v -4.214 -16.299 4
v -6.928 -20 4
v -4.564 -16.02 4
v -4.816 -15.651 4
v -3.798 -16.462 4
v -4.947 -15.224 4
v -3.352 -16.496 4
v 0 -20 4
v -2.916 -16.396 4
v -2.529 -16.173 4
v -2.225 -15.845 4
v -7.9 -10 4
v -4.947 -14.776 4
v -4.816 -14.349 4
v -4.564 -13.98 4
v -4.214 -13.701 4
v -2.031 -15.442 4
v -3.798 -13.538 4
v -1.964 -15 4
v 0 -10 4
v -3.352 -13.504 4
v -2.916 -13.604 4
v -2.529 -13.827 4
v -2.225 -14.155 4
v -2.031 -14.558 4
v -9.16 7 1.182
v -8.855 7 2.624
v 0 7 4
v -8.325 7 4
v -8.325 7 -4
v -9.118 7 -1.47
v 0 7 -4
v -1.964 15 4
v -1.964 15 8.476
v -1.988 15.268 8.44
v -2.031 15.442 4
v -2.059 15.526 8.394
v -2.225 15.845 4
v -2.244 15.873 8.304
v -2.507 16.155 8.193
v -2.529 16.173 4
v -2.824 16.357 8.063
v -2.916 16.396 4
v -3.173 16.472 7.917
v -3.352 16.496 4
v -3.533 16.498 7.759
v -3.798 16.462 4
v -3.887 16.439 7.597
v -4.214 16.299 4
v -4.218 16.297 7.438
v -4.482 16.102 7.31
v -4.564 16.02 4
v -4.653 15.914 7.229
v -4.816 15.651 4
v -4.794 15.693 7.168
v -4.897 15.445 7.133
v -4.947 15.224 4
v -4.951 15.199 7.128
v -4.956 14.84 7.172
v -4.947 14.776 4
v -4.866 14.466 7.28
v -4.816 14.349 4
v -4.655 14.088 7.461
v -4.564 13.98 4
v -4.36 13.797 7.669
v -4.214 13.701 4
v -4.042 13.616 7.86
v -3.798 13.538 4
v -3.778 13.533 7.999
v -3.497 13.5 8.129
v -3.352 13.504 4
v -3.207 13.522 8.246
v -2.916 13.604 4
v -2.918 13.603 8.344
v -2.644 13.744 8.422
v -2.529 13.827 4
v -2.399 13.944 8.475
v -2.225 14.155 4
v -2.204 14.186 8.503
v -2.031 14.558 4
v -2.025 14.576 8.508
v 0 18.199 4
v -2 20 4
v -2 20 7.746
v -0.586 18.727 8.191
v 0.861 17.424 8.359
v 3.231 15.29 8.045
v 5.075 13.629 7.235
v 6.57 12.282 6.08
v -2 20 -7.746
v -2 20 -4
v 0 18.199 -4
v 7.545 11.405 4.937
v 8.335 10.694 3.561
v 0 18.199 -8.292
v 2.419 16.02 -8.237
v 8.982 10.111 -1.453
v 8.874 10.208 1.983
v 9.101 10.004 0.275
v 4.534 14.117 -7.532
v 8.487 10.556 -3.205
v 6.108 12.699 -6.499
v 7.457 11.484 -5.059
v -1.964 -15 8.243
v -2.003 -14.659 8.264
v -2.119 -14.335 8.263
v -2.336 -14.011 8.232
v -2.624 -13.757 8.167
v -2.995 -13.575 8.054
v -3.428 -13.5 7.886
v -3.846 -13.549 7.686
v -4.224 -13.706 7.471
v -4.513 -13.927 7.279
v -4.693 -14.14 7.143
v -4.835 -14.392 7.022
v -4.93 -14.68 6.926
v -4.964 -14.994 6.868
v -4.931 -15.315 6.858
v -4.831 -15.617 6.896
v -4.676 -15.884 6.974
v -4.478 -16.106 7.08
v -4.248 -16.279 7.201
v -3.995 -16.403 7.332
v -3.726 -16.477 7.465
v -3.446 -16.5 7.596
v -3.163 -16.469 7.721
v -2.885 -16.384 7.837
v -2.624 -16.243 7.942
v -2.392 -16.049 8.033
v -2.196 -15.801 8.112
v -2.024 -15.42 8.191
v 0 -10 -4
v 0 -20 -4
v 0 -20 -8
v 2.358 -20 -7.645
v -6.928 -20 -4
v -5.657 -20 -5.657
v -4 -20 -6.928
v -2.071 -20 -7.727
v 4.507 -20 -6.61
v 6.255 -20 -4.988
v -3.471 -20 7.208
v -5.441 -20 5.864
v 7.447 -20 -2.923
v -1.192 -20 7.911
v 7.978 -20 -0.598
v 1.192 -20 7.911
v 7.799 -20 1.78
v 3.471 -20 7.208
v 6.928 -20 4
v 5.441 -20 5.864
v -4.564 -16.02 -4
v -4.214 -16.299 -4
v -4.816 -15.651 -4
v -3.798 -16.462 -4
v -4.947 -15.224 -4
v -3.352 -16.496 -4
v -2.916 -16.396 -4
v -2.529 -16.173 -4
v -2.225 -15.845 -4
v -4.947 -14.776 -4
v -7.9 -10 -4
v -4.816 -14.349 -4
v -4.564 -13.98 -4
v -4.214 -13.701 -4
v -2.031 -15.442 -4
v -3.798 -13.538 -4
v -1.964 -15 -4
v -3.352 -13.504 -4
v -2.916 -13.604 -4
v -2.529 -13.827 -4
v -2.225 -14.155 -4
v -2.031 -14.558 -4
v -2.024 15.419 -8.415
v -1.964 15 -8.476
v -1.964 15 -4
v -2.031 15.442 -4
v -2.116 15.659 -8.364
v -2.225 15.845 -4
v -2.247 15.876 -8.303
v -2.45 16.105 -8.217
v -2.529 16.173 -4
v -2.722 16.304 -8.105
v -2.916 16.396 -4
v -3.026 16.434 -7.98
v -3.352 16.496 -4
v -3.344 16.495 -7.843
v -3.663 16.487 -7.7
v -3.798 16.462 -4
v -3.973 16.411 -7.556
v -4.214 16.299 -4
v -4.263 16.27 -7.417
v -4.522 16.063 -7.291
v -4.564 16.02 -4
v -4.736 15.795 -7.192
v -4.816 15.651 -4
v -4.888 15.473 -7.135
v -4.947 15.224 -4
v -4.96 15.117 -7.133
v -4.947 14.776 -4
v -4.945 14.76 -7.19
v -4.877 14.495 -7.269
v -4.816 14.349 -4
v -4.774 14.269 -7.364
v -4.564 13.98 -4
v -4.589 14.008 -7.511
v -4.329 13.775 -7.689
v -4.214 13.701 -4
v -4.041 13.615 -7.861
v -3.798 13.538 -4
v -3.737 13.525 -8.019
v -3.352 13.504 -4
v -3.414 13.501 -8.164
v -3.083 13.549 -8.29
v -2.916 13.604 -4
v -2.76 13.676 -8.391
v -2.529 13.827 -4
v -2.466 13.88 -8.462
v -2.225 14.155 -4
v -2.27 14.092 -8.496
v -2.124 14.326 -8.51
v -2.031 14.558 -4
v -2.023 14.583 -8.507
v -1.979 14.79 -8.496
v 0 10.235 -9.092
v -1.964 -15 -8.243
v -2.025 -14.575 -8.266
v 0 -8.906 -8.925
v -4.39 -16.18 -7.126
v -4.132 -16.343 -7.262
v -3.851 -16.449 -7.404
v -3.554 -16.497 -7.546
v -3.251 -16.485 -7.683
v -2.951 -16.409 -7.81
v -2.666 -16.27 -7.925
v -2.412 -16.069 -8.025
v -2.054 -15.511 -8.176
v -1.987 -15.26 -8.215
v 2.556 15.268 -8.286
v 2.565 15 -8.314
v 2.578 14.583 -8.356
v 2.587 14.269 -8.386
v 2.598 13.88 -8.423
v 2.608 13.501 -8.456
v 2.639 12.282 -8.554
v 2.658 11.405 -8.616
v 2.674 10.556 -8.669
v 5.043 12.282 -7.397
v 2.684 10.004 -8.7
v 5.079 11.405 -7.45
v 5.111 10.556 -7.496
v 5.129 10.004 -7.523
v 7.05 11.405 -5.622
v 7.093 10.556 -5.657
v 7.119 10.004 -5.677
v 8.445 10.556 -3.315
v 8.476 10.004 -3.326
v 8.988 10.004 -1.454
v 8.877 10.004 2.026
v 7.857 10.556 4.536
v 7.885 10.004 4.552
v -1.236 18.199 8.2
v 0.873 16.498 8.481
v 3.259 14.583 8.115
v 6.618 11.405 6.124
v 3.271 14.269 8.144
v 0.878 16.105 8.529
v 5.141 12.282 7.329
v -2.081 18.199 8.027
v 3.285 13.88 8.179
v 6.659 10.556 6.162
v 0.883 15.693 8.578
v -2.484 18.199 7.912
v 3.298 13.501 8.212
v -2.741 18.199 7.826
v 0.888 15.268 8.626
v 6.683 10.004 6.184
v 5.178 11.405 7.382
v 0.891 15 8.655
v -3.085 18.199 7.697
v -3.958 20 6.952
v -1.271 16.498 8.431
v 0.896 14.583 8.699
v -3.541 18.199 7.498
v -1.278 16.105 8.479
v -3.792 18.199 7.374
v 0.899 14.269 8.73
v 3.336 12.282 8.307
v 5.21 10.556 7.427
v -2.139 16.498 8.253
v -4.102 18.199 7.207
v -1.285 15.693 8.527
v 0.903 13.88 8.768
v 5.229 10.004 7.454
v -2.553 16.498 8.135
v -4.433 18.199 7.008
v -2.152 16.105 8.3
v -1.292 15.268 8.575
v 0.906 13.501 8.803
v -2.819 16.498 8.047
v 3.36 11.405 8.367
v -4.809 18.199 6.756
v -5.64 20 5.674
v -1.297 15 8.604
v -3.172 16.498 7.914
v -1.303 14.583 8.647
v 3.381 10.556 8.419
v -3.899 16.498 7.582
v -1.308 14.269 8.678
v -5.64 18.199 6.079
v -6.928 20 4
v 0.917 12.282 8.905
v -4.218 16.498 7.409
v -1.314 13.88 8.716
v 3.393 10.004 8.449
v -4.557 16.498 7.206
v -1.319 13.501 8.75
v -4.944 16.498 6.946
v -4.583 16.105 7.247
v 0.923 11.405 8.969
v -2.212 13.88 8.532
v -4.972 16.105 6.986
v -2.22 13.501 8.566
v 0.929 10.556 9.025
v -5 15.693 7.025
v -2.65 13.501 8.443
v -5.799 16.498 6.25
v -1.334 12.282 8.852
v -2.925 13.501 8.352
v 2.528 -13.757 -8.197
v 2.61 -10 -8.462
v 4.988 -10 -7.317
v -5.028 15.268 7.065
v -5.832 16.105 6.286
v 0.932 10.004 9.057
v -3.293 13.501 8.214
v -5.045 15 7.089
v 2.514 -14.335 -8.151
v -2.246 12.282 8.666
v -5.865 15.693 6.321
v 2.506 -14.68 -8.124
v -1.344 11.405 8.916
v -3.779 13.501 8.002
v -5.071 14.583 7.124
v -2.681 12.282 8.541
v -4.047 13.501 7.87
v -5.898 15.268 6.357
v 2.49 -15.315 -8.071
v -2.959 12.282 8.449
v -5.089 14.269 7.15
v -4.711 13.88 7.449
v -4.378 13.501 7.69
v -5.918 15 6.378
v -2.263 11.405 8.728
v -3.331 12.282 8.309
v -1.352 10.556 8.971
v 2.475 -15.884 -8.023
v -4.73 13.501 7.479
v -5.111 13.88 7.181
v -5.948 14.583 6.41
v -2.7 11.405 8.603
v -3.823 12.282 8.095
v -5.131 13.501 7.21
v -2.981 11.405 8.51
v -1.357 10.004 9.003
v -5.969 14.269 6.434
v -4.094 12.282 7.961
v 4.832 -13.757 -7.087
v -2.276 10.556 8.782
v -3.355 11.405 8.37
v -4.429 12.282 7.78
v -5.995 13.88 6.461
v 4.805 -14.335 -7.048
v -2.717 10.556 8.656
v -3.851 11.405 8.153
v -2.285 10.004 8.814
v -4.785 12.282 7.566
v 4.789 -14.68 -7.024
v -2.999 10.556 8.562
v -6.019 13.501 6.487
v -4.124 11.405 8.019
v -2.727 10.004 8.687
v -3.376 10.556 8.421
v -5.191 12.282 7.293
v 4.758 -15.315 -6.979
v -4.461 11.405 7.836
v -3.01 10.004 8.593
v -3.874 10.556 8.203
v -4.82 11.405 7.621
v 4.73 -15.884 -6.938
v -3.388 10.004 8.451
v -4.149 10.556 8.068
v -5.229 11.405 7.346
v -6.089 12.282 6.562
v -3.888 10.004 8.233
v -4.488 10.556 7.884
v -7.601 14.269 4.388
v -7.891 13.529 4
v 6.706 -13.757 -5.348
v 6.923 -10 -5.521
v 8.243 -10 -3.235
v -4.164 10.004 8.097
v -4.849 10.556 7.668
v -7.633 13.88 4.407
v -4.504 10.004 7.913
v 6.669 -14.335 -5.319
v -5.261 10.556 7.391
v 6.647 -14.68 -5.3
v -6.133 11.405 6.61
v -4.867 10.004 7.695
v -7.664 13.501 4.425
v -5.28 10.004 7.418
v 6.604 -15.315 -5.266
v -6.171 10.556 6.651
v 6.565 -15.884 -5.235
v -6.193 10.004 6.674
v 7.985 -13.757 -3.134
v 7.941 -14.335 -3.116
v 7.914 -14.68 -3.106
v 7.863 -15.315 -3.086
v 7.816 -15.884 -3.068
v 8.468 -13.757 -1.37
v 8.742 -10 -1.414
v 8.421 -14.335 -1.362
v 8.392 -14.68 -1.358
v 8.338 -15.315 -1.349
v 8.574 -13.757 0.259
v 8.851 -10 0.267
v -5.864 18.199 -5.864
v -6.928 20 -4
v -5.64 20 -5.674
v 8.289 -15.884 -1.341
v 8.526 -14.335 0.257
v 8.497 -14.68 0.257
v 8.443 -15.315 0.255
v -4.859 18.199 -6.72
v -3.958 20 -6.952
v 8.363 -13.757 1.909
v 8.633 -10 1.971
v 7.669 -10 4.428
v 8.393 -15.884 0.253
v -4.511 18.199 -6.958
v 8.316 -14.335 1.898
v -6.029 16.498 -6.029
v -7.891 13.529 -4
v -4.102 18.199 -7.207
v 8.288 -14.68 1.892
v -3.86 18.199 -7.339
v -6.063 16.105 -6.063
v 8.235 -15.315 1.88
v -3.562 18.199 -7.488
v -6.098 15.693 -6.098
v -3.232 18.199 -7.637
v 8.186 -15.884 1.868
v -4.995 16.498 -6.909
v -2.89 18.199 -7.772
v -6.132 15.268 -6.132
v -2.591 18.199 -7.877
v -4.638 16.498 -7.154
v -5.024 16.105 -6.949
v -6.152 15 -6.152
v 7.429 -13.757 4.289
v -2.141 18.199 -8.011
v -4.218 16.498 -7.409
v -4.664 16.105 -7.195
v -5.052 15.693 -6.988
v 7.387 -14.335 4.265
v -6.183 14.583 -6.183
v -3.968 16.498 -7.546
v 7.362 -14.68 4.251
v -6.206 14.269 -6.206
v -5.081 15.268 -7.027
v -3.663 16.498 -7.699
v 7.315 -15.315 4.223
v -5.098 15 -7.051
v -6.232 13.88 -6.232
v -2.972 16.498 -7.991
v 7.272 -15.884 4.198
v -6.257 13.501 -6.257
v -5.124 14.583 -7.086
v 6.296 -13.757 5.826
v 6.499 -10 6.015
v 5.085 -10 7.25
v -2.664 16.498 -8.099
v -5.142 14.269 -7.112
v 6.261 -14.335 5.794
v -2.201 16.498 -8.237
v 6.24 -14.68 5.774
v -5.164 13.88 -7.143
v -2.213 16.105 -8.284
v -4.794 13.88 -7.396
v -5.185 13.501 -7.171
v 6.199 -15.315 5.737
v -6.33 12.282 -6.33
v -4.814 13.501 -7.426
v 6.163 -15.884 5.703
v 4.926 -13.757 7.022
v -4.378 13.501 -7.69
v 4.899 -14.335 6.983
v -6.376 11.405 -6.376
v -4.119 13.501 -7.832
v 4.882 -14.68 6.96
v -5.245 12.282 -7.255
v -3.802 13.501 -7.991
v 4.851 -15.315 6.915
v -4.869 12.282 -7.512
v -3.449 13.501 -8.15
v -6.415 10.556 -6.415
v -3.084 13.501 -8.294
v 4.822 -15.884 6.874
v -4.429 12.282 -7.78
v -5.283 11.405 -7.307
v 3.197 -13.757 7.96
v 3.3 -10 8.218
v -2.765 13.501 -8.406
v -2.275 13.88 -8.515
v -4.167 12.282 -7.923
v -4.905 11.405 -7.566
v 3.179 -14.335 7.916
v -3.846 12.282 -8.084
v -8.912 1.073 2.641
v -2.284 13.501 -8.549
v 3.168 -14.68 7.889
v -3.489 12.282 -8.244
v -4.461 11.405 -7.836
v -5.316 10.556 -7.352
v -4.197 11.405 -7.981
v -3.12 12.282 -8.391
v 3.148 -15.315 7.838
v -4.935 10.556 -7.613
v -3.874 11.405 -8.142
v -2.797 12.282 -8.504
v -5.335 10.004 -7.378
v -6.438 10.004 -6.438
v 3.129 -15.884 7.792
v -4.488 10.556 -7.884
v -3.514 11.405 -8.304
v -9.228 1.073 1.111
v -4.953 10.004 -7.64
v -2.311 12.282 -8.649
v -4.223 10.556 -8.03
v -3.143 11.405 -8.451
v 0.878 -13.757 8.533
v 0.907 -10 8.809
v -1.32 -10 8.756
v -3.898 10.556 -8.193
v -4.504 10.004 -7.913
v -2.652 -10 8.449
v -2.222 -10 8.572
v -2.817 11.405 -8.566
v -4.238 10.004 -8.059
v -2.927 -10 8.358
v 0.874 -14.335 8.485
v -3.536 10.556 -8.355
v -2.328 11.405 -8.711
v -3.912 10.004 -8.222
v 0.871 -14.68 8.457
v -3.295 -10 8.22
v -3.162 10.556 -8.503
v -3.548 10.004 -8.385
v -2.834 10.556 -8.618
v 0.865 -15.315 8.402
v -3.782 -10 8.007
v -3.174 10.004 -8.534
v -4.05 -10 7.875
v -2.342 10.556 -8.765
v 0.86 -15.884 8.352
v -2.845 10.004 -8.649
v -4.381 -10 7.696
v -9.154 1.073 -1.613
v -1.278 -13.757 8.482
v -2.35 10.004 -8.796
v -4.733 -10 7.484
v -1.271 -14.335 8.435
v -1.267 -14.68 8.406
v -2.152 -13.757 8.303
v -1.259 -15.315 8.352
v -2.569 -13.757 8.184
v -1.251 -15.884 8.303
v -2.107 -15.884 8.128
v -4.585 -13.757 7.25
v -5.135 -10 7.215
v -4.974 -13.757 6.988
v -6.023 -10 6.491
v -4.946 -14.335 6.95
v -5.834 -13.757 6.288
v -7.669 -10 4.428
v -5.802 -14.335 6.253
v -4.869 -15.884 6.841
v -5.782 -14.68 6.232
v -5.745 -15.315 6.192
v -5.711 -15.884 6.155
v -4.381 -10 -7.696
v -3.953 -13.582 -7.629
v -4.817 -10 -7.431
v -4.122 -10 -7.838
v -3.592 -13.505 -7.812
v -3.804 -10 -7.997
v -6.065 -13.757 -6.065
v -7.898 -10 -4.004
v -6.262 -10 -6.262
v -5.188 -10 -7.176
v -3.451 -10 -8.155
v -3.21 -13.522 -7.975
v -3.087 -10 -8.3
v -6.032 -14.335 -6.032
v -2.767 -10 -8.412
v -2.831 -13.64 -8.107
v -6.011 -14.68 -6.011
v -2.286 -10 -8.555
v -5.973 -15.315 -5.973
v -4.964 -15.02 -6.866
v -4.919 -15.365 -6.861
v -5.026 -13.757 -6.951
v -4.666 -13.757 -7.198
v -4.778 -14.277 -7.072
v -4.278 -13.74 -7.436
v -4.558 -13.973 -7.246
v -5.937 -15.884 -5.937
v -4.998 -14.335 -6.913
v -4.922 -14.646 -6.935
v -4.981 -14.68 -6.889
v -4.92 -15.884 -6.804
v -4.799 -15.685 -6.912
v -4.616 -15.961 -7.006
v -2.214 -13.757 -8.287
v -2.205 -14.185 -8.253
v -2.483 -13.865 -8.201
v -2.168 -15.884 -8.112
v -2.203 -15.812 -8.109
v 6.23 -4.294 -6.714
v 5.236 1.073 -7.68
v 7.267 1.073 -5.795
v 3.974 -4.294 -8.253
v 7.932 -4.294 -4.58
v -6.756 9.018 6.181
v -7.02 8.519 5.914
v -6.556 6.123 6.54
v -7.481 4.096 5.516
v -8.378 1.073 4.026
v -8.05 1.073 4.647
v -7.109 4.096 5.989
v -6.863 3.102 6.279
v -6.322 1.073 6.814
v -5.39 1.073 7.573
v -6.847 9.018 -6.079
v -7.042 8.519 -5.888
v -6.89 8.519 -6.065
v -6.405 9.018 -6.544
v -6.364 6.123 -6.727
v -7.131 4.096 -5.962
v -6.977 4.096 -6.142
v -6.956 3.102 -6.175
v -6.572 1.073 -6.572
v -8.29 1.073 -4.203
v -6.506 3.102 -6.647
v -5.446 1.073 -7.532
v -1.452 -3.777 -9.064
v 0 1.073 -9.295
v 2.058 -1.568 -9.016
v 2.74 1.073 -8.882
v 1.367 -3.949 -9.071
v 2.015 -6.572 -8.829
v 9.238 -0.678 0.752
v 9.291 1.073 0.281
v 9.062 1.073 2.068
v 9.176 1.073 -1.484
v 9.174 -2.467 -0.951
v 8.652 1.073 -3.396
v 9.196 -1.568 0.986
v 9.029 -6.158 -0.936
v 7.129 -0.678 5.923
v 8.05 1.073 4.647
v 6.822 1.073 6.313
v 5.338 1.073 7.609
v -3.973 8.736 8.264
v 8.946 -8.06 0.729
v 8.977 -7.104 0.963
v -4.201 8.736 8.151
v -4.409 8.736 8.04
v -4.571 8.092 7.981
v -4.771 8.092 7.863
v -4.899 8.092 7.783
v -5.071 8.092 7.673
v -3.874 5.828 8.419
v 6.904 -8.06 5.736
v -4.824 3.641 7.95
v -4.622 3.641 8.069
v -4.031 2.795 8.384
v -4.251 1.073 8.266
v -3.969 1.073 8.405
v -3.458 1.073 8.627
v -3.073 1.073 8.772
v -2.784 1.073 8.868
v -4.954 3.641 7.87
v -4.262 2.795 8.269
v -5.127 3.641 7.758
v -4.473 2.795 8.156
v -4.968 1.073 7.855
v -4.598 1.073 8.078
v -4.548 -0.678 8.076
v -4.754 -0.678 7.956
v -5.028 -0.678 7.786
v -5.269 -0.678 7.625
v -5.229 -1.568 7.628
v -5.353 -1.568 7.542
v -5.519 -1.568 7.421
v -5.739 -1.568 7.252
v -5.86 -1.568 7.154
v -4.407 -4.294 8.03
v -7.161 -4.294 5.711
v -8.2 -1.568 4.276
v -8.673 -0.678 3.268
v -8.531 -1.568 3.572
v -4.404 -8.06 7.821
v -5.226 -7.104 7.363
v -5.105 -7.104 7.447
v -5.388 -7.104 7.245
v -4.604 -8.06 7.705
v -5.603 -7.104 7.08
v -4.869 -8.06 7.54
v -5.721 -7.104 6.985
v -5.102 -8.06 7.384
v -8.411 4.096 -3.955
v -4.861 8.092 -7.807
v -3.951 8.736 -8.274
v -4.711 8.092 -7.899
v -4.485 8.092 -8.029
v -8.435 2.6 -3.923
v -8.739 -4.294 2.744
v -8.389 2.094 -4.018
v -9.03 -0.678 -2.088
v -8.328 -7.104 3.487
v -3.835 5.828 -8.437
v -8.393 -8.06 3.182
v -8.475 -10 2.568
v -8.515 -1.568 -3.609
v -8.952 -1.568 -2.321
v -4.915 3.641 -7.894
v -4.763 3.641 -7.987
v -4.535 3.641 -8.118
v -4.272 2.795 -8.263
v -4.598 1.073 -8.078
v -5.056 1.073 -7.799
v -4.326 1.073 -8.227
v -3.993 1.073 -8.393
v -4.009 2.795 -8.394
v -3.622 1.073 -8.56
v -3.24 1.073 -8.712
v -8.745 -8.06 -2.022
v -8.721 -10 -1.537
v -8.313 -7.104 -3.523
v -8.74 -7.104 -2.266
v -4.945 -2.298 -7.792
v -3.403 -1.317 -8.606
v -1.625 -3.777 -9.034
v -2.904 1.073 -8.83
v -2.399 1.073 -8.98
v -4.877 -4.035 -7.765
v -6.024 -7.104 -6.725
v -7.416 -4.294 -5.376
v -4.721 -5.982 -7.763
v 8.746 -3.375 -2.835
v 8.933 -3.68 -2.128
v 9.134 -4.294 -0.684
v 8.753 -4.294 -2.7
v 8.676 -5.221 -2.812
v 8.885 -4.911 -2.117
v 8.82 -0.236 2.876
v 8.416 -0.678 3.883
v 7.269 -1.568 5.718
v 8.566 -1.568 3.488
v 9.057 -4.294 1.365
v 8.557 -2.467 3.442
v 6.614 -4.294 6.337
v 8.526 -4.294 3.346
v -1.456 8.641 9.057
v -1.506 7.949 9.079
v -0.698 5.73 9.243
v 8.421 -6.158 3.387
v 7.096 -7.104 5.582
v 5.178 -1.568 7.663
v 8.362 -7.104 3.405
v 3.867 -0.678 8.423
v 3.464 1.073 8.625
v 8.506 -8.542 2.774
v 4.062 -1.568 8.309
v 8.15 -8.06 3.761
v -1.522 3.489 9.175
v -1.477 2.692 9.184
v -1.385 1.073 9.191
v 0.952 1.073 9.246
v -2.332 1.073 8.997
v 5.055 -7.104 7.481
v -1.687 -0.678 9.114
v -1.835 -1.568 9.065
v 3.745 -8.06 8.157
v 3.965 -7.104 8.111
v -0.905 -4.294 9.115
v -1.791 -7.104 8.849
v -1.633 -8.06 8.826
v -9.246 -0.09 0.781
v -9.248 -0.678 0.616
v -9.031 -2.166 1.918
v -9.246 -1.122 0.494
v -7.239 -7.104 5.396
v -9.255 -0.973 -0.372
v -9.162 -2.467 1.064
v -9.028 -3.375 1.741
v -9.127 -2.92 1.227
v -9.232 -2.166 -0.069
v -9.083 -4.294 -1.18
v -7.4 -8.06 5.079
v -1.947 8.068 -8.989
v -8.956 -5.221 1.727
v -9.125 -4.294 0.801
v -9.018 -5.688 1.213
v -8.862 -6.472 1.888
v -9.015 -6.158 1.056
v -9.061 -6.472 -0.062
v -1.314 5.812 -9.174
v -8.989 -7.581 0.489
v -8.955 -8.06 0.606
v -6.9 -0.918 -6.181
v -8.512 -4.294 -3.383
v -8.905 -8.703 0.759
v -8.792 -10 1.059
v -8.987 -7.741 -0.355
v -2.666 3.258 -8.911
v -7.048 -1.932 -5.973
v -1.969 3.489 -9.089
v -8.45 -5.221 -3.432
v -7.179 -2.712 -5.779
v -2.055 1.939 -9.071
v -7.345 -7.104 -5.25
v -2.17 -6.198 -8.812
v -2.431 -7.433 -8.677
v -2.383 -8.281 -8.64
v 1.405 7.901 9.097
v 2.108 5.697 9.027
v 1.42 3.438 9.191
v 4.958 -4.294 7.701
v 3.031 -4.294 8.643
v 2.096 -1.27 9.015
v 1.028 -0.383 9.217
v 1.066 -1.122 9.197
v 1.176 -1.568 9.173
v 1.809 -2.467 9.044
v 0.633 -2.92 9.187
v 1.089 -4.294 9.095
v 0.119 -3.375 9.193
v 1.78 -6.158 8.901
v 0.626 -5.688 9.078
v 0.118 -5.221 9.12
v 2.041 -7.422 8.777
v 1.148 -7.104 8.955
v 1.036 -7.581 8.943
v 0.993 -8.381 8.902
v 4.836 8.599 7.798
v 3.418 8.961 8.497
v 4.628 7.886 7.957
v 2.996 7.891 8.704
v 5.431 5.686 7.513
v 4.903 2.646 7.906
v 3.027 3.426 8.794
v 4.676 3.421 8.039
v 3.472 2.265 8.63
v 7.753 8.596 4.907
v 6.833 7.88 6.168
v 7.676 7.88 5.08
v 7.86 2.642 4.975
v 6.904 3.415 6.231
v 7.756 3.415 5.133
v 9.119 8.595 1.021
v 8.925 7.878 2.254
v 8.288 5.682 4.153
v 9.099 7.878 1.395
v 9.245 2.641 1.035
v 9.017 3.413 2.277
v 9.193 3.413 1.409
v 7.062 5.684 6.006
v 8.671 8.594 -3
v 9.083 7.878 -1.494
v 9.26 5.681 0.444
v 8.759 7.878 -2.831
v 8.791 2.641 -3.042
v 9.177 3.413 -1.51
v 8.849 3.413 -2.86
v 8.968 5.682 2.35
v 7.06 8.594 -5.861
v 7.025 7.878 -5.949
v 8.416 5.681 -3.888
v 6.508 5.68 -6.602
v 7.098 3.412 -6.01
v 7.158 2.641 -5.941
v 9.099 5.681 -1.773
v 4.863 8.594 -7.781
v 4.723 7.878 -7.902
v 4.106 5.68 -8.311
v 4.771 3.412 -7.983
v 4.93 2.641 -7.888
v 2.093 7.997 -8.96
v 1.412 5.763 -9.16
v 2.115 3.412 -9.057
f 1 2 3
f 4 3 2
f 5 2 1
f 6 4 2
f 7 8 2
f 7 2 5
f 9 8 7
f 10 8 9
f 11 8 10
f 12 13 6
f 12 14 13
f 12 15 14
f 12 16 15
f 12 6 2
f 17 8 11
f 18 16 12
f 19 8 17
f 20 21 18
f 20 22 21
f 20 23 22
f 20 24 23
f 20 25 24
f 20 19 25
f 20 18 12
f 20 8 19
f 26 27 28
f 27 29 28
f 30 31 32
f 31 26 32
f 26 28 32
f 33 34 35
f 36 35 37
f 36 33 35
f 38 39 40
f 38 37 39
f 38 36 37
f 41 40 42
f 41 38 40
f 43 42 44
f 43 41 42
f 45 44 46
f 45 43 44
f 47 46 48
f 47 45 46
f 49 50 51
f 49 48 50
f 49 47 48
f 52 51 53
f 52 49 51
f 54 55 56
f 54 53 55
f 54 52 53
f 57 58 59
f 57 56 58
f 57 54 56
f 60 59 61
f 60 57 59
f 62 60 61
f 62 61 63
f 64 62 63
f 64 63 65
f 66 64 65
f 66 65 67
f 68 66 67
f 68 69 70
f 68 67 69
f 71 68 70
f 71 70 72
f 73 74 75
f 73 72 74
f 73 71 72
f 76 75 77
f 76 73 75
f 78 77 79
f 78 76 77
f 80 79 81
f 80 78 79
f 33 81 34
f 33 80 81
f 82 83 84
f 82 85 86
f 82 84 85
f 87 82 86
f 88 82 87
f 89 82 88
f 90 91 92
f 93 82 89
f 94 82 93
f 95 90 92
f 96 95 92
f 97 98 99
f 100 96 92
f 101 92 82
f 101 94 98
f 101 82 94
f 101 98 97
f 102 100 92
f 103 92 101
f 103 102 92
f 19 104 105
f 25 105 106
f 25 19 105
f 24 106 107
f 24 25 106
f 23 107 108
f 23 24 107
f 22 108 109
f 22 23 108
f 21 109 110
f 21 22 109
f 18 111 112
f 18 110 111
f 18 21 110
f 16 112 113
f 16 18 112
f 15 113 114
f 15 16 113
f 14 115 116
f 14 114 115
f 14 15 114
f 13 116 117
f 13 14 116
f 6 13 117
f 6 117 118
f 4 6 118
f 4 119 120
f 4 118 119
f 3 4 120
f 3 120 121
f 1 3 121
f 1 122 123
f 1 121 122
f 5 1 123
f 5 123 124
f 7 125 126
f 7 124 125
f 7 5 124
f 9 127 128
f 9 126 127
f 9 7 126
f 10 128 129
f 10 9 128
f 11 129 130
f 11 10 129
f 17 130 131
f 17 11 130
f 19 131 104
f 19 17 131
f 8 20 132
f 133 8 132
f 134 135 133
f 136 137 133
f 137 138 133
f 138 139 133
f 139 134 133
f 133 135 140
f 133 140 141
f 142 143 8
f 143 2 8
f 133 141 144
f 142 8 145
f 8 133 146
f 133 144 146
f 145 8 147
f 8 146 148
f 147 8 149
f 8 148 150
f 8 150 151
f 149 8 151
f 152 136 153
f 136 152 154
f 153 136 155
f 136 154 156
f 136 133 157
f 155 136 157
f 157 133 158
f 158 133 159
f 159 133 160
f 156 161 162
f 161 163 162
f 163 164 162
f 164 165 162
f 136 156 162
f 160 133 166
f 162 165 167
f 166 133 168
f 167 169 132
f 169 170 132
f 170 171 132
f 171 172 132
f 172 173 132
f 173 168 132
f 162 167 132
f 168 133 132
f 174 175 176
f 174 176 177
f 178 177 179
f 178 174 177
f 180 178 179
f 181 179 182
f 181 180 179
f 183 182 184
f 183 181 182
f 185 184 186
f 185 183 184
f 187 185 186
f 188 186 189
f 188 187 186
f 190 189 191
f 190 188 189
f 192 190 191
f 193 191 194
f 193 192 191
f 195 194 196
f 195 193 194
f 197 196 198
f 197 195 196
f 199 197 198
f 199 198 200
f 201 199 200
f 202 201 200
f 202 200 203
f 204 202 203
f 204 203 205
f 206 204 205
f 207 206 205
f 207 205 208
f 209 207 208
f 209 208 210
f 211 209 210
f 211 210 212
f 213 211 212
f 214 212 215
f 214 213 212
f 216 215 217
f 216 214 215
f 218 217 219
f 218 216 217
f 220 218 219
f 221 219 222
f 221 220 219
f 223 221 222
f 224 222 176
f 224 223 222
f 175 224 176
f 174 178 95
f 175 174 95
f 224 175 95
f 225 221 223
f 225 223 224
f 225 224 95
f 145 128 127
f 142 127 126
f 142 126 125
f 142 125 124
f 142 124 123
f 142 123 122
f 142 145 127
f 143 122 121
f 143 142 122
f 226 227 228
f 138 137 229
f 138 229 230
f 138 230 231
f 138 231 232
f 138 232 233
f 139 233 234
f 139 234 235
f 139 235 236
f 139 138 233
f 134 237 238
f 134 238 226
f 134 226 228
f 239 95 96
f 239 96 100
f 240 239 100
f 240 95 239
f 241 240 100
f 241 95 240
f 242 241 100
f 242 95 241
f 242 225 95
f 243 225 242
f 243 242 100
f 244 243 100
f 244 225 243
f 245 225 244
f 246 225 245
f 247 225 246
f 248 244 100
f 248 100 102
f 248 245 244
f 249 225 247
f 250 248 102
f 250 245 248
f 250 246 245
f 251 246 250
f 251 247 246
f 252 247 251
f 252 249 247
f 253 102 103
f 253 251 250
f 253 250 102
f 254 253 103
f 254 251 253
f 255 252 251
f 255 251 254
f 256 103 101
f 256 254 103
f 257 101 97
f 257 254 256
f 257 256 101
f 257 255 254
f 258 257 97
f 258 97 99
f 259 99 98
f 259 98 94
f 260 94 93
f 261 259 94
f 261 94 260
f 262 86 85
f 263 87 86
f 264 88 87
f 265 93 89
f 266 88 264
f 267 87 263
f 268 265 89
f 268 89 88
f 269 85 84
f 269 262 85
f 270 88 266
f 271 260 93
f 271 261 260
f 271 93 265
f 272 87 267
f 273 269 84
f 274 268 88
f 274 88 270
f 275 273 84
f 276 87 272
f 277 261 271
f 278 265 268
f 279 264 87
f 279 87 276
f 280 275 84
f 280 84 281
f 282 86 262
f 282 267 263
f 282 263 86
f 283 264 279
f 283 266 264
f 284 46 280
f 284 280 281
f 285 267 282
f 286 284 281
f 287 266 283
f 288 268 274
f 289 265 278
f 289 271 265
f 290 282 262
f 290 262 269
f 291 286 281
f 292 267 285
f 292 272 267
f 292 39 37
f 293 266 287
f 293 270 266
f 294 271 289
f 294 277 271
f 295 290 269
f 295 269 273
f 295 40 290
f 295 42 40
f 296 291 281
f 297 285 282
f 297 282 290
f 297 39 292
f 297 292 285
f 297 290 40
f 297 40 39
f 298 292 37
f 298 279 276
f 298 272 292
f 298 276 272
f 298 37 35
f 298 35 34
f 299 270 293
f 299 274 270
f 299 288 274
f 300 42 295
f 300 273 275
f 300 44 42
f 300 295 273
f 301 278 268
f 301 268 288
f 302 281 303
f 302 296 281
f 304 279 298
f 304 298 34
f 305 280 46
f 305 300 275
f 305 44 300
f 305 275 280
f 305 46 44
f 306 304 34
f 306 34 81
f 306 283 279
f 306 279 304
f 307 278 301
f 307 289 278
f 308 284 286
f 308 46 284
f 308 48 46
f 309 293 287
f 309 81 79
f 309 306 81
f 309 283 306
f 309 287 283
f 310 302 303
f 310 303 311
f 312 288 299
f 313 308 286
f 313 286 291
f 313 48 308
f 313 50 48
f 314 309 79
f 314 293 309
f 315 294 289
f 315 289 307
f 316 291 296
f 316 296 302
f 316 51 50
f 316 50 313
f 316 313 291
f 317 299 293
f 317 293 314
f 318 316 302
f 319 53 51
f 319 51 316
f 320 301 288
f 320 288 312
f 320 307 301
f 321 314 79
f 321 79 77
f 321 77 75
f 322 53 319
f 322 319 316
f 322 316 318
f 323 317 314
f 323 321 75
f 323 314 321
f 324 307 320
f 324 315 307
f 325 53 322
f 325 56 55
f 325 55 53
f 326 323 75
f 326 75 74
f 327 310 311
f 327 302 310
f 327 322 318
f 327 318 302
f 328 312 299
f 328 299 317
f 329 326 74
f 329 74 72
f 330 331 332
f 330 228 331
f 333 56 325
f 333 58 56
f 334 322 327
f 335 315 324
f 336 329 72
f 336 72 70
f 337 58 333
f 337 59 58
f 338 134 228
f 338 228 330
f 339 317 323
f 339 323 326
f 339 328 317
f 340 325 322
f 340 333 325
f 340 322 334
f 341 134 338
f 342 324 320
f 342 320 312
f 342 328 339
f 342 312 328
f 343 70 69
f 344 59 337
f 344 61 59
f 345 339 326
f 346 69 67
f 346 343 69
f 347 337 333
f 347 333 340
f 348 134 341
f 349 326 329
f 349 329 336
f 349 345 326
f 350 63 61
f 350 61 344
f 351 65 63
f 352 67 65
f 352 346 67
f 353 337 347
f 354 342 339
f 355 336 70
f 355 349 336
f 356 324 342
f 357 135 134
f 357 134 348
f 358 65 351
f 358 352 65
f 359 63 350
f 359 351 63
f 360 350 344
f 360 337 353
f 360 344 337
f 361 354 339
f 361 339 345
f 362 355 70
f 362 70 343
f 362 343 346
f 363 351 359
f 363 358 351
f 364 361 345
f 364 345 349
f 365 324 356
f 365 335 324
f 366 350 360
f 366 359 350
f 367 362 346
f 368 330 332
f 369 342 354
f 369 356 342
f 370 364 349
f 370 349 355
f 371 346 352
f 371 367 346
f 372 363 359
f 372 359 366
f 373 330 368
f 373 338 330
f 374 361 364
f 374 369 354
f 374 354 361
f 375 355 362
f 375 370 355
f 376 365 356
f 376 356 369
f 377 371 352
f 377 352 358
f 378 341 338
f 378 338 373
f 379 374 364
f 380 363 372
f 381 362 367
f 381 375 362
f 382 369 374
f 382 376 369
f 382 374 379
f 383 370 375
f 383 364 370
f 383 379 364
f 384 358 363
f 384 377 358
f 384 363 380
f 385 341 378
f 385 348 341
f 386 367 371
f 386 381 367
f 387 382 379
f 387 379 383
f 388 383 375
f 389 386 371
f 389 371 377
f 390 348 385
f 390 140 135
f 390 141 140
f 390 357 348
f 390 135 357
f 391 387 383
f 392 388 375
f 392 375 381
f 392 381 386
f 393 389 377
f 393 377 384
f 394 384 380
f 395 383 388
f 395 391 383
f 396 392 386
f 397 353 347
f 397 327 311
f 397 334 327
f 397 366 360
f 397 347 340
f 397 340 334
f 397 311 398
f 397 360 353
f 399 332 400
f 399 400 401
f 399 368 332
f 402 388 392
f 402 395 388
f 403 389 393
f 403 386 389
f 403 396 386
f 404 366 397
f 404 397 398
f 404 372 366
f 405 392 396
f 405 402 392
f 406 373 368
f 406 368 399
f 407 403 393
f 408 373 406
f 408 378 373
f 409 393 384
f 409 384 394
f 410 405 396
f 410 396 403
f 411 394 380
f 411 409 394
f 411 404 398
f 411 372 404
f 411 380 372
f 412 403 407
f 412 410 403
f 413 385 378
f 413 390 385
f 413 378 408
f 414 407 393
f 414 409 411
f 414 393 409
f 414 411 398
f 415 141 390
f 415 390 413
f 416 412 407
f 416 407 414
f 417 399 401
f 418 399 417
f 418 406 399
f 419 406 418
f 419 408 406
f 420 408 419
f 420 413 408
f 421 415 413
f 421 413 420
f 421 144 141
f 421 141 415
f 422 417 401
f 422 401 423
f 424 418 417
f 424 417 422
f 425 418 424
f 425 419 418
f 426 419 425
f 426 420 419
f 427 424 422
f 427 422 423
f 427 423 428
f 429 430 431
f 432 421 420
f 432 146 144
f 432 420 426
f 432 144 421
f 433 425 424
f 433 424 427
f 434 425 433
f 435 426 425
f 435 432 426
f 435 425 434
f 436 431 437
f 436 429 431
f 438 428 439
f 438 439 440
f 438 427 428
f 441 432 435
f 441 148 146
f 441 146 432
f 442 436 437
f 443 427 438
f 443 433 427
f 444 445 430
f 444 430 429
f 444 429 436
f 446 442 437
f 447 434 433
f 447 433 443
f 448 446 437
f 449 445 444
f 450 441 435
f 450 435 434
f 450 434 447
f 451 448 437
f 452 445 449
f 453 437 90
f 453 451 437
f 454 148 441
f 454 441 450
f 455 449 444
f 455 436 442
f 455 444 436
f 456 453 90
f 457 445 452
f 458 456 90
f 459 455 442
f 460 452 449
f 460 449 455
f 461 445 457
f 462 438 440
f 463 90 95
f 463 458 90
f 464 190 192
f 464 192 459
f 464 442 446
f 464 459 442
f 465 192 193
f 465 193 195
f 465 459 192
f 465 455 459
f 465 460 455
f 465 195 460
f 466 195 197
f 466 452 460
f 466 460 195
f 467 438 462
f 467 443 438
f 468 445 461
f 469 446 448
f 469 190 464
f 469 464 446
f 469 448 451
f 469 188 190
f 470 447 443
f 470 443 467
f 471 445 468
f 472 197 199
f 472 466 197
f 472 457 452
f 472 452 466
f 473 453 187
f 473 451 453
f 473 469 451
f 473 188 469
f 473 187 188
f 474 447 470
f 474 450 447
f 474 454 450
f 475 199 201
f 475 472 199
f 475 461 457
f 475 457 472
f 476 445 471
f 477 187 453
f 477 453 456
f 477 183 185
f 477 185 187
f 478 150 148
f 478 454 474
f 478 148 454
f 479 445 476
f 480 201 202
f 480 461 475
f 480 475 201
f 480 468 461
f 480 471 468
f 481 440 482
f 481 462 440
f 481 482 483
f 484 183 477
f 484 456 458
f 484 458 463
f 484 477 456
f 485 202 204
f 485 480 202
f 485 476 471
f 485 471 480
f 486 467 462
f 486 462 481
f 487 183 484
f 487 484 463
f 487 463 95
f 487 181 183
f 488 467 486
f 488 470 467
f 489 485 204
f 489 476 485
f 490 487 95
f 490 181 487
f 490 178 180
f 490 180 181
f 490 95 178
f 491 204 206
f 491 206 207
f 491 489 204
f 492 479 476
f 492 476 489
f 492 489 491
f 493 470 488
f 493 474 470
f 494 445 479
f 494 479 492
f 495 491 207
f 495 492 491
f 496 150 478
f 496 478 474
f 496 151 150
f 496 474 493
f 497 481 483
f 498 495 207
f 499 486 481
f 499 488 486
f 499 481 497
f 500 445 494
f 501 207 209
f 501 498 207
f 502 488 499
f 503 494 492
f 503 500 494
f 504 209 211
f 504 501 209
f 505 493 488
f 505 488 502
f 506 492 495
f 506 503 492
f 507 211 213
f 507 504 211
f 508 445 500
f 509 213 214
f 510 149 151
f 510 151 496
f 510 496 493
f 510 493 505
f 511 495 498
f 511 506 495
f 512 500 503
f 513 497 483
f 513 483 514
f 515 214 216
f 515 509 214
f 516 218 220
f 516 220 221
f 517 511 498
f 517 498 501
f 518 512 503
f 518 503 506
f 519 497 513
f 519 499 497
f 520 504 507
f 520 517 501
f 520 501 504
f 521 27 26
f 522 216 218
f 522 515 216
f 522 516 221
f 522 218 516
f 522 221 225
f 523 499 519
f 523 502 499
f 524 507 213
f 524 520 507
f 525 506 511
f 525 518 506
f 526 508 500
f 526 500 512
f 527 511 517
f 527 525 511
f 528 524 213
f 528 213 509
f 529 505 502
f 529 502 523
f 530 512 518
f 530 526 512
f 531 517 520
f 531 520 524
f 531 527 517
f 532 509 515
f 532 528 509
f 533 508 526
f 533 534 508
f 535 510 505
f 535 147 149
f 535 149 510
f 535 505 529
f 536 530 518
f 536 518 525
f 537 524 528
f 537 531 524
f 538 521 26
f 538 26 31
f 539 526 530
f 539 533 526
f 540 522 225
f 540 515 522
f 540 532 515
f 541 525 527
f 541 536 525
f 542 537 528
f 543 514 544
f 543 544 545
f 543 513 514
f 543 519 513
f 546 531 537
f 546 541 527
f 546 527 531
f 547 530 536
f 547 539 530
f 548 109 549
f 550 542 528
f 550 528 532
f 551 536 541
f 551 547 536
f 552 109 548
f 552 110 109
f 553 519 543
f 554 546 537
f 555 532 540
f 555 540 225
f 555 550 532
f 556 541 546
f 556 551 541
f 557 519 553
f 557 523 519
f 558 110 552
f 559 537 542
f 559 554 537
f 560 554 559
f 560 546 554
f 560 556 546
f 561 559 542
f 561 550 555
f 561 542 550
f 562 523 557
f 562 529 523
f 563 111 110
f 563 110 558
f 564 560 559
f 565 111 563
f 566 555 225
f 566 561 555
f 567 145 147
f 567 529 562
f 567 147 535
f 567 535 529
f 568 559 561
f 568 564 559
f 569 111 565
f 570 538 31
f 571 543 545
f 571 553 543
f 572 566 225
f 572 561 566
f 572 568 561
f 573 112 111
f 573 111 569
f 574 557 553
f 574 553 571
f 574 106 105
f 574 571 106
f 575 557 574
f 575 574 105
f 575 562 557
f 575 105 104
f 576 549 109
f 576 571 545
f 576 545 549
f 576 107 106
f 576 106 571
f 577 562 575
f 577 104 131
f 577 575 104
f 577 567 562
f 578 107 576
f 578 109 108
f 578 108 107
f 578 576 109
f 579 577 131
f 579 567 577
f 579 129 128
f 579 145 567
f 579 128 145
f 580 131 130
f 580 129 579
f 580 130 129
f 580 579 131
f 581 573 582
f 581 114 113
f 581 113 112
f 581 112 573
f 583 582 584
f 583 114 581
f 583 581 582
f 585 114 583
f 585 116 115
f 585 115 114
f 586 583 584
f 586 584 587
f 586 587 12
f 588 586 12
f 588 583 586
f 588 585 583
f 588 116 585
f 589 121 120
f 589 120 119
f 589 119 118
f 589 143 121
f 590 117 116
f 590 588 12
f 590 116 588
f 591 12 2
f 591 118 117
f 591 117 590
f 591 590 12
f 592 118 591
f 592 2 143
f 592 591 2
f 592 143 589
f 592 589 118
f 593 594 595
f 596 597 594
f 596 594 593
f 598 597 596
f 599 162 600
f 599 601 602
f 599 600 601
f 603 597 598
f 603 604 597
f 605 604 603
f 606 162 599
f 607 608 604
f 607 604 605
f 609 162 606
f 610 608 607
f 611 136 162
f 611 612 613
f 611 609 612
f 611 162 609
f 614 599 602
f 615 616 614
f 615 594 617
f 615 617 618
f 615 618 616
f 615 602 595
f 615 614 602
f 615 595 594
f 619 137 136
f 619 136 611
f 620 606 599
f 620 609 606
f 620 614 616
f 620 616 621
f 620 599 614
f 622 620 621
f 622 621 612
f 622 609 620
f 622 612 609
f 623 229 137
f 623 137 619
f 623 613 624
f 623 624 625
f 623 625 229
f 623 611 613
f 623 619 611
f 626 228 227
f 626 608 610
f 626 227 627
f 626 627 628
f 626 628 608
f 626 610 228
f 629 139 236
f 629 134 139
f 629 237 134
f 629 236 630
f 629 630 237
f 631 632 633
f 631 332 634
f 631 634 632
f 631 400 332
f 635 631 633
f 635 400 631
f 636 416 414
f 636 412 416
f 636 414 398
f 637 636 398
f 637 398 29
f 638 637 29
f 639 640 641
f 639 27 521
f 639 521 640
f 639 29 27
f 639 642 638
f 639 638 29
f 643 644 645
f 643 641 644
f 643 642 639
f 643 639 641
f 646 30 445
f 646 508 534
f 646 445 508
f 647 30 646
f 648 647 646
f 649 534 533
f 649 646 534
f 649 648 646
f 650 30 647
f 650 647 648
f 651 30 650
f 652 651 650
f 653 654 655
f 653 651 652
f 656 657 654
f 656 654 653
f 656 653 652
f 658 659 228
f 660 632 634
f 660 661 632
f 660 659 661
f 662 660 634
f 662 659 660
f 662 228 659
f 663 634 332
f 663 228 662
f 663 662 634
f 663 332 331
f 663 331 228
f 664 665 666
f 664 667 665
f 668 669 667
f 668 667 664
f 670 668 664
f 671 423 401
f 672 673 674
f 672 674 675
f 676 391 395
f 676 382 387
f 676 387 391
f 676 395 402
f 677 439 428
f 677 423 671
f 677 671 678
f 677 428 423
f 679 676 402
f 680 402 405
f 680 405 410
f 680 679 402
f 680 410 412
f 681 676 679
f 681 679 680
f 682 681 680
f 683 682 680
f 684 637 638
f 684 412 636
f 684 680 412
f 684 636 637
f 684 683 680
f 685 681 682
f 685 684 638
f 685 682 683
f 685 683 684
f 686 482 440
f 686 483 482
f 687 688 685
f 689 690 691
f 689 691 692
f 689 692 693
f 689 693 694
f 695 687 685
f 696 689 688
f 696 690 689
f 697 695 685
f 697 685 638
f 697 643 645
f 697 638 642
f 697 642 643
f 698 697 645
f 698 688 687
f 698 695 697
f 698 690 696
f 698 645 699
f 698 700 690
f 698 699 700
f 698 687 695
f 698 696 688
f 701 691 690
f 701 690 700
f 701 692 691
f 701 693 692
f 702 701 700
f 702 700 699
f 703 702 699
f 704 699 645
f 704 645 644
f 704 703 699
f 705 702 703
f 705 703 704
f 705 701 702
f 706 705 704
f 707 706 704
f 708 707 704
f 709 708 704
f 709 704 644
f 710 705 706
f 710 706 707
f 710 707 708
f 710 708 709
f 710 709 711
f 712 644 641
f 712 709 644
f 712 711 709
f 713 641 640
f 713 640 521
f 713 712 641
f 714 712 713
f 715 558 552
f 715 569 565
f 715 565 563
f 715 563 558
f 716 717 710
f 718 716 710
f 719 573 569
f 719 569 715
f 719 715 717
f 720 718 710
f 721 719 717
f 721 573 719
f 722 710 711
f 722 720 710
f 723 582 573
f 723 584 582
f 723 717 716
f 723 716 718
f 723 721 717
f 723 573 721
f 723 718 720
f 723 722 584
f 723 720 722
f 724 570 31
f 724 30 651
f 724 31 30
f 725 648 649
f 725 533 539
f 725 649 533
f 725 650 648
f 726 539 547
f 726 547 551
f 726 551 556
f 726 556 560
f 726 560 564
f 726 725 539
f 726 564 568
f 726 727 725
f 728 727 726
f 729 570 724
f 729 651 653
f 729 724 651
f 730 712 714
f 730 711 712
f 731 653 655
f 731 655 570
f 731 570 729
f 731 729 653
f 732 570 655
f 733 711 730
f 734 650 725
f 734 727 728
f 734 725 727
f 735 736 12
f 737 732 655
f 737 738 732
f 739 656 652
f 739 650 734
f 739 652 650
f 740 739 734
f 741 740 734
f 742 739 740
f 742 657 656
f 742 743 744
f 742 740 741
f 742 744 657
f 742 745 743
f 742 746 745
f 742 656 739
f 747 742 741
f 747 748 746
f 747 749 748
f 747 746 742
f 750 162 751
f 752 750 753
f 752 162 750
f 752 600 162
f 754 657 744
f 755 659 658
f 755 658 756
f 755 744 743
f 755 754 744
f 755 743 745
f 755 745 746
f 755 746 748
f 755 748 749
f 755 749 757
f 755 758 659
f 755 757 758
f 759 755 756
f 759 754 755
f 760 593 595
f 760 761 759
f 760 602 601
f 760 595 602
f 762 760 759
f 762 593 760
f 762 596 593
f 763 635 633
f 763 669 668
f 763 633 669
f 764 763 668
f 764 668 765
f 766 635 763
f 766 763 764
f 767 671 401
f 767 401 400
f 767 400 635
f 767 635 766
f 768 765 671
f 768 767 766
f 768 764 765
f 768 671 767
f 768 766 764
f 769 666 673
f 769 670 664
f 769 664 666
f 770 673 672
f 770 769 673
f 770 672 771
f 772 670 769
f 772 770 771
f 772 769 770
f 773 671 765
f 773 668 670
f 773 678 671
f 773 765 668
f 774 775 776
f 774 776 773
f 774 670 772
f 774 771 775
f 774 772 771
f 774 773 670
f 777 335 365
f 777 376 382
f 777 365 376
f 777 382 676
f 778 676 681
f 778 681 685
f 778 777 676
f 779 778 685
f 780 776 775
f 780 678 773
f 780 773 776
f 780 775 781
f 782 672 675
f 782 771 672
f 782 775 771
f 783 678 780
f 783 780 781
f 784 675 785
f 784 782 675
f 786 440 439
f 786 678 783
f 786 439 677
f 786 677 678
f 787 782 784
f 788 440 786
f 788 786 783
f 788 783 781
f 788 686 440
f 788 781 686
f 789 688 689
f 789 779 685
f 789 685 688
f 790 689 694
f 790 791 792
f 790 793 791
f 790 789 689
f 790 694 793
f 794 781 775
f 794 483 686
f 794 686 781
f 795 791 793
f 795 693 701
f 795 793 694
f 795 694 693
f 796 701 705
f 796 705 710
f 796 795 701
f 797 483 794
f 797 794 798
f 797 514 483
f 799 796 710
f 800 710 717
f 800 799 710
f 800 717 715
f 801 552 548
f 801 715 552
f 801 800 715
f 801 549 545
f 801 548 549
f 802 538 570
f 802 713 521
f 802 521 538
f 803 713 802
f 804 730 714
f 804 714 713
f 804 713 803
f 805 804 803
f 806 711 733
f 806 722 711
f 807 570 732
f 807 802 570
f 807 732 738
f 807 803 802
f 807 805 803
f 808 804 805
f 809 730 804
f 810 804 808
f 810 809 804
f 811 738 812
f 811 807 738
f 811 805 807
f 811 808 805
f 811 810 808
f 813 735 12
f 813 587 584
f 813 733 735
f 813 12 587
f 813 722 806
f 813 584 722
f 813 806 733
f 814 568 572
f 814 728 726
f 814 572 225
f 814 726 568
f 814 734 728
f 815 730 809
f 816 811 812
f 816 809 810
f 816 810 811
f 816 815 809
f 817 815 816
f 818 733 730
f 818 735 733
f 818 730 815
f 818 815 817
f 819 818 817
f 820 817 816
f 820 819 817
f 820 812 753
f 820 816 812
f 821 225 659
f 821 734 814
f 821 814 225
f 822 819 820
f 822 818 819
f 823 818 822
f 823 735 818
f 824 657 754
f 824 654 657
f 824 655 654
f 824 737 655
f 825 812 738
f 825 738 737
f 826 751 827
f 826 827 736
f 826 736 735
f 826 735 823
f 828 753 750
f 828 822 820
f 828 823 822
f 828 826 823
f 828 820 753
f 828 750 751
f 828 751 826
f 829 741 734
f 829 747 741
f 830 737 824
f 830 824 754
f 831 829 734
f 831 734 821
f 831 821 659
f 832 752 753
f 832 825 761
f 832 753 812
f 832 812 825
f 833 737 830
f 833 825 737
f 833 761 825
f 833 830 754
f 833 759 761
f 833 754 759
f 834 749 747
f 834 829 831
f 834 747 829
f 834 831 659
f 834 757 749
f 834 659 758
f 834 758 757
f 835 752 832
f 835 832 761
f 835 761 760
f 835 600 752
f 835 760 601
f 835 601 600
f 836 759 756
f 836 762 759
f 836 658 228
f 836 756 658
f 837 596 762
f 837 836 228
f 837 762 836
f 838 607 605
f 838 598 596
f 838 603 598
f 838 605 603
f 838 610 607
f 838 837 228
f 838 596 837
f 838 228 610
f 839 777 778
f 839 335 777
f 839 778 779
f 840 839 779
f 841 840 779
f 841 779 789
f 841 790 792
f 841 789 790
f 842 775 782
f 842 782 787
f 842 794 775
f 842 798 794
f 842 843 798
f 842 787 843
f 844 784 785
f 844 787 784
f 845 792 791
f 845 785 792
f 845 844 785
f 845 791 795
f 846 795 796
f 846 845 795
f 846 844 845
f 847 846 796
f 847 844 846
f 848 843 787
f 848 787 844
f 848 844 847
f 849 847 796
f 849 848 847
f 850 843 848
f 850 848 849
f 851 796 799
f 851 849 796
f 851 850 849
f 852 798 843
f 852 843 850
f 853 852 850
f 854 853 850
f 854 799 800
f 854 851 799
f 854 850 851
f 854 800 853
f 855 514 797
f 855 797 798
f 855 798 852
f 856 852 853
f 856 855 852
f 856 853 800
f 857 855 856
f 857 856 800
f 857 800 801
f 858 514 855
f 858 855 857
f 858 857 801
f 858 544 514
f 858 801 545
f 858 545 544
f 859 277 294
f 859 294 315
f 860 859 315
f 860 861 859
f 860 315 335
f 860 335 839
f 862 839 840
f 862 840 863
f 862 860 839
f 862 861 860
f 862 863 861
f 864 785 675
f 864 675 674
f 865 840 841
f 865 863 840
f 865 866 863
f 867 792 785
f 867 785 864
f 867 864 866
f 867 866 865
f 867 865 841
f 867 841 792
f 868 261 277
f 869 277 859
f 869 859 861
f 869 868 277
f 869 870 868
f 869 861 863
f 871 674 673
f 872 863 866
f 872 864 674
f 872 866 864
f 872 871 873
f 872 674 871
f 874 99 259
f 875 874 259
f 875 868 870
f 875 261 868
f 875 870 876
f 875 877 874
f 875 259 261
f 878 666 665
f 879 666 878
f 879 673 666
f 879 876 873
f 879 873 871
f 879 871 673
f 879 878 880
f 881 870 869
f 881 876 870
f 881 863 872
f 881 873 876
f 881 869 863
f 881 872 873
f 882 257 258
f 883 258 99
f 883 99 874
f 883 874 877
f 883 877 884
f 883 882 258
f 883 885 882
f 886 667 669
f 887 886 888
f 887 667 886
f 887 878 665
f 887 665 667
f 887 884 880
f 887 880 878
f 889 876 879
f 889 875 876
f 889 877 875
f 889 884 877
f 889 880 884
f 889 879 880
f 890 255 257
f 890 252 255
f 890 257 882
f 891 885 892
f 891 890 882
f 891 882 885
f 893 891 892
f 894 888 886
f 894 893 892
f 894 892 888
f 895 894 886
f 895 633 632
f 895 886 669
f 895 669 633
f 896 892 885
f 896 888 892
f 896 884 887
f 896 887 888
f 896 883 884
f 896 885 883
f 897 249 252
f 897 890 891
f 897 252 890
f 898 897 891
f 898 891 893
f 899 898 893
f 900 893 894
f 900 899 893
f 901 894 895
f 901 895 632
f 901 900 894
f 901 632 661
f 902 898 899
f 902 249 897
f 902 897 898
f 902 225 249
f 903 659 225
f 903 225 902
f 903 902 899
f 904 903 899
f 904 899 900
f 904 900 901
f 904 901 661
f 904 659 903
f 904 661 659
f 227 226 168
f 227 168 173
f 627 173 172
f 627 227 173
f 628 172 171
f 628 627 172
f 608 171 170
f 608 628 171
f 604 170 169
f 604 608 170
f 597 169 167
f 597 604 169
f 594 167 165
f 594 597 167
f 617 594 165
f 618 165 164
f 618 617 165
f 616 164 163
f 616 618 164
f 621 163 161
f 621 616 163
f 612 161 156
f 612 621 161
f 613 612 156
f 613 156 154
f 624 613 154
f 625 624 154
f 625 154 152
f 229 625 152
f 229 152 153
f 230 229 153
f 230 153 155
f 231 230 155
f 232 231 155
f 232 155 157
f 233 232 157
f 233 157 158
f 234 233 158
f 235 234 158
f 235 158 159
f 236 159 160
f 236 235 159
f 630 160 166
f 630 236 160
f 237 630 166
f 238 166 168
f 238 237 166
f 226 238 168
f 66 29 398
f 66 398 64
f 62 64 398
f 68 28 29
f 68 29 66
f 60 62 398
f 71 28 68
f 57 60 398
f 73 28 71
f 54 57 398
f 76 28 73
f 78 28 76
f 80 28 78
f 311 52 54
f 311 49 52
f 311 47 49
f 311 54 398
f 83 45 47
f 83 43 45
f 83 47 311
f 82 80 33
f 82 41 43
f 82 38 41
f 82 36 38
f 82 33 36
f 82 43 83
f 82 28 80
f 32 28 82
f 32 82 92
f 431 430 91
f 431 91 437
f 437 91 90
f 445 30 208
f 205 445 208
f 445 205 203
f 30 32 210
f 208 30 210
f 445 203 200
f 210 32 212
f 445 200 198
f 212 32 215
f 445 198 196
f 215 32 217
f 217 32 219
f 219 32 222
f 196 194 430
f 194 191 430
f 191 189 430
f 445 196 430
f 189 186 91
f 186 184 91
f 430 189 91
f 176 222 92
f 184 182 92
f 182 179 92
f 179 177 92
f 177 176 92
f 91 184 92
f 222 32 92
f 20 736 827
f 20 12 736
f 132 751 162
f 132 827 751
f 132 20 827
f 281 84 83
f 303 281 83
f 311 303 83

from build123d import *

# Parameters (mm, degrees)
SKETCH2_W               = 8
SKETCH2_H               = 13
SKETCH2_H_2             = 10
CUT_EXTRUDE1_DEPTH      = 24.938835821
CUT_EXTRUDE2_DEPTH      = 24.938835821
CUT_EXTRUDE2_DEPTH_BACK = 24.938835821
SKETCH3_R               = 1.5
CUT_EXTRUDE3_DEPTH      = 10
CUT_EXTRUDE3_DEPTH_BACK = 10


with BuildPart() as part:
    # Sketch1 → Revolve1 (revolve)
    with BuildSketch(Plane(origin=(0, 0, 0), x_dir=(0, 0, -1), z_dir=(1, 0, 0))):
        with BuildLine():
            Line((0, 20), (0, -20))
            Line((0, -20), (8, -20))
            add(Edge.make_bspline(
                [(8, 20), (10.604722665, 5.227883705), (8, -20)],
                knots=[0, 0, 0, 1, 1, 1], degree=2))
            Line((8, 20), (0, 20))
        make_face()
    revolve(axis=Axis((0, 20, 0), (0, -1, 0)))

    # Sketch2 → Cut-Extrude1 (cut, through all)
    with BuildSketch(Plane(origin=(0, 0, 0), x_dir=(0, 0, -1), z_dir=(1, 0, 0))):
        with Locations((0, 13.5)):
            Rectangle(SKETCH2_W, SKETCH2_H)
        with Locations((0, -15)):
            Rectangle(SKETCH2_W, SKETCH2_H_2)
    extrude(amount=-CUT_EXTRUDE1_DEPTH, mode=Mode.SUBTRACT)

    # Sketch3 → Cut-Extrude2 (cut, two sides: drawn at the far end of the back side and taken through both)
    with BuildSketch(Plane.XY.offset(-CUT_EXTRUDE2_DEPTH_BACK)):
        with Locations((-3.464101615, 15)):
            Circle(SKETCH3_R)
        with Locations((-3.464101615, -15)):
            Circle(SKETCH3_R)
    extrude(amount=CUT_EXTRUDE2_DEPTH + CUT_EXTRUDE2_DEPTH_BACK, mode=Mode.SUBTRACT)

    # Sketch4 → Cut-Extrude3 (cut, two sides: drawn at the far end of the back side and taken through both)
    with BuildSketch(Plane.XY.offset(-CUT_EXTRUDE3_DEPTH_BACK)):
        with BuildLine():
            Line((-2, 20), (9.10519633, 10))
            add(Edge.make_bspline(
                [(9.10519633, 10), (8.795626613, 15.487777253), (8, 20)],
                knots=[0.694544596, 0.694544596, 0.694544596, 1, 1, 1], degree=2))
            Line((8, 20), (-2, 20))
        make_face()
    extrude(amount=CUT_EXTRUDE3_DEPTH + CUT_EXTRUDE3_DEPTH_BACK, mode=Mode.SUBTRACT)


solid = part.part
